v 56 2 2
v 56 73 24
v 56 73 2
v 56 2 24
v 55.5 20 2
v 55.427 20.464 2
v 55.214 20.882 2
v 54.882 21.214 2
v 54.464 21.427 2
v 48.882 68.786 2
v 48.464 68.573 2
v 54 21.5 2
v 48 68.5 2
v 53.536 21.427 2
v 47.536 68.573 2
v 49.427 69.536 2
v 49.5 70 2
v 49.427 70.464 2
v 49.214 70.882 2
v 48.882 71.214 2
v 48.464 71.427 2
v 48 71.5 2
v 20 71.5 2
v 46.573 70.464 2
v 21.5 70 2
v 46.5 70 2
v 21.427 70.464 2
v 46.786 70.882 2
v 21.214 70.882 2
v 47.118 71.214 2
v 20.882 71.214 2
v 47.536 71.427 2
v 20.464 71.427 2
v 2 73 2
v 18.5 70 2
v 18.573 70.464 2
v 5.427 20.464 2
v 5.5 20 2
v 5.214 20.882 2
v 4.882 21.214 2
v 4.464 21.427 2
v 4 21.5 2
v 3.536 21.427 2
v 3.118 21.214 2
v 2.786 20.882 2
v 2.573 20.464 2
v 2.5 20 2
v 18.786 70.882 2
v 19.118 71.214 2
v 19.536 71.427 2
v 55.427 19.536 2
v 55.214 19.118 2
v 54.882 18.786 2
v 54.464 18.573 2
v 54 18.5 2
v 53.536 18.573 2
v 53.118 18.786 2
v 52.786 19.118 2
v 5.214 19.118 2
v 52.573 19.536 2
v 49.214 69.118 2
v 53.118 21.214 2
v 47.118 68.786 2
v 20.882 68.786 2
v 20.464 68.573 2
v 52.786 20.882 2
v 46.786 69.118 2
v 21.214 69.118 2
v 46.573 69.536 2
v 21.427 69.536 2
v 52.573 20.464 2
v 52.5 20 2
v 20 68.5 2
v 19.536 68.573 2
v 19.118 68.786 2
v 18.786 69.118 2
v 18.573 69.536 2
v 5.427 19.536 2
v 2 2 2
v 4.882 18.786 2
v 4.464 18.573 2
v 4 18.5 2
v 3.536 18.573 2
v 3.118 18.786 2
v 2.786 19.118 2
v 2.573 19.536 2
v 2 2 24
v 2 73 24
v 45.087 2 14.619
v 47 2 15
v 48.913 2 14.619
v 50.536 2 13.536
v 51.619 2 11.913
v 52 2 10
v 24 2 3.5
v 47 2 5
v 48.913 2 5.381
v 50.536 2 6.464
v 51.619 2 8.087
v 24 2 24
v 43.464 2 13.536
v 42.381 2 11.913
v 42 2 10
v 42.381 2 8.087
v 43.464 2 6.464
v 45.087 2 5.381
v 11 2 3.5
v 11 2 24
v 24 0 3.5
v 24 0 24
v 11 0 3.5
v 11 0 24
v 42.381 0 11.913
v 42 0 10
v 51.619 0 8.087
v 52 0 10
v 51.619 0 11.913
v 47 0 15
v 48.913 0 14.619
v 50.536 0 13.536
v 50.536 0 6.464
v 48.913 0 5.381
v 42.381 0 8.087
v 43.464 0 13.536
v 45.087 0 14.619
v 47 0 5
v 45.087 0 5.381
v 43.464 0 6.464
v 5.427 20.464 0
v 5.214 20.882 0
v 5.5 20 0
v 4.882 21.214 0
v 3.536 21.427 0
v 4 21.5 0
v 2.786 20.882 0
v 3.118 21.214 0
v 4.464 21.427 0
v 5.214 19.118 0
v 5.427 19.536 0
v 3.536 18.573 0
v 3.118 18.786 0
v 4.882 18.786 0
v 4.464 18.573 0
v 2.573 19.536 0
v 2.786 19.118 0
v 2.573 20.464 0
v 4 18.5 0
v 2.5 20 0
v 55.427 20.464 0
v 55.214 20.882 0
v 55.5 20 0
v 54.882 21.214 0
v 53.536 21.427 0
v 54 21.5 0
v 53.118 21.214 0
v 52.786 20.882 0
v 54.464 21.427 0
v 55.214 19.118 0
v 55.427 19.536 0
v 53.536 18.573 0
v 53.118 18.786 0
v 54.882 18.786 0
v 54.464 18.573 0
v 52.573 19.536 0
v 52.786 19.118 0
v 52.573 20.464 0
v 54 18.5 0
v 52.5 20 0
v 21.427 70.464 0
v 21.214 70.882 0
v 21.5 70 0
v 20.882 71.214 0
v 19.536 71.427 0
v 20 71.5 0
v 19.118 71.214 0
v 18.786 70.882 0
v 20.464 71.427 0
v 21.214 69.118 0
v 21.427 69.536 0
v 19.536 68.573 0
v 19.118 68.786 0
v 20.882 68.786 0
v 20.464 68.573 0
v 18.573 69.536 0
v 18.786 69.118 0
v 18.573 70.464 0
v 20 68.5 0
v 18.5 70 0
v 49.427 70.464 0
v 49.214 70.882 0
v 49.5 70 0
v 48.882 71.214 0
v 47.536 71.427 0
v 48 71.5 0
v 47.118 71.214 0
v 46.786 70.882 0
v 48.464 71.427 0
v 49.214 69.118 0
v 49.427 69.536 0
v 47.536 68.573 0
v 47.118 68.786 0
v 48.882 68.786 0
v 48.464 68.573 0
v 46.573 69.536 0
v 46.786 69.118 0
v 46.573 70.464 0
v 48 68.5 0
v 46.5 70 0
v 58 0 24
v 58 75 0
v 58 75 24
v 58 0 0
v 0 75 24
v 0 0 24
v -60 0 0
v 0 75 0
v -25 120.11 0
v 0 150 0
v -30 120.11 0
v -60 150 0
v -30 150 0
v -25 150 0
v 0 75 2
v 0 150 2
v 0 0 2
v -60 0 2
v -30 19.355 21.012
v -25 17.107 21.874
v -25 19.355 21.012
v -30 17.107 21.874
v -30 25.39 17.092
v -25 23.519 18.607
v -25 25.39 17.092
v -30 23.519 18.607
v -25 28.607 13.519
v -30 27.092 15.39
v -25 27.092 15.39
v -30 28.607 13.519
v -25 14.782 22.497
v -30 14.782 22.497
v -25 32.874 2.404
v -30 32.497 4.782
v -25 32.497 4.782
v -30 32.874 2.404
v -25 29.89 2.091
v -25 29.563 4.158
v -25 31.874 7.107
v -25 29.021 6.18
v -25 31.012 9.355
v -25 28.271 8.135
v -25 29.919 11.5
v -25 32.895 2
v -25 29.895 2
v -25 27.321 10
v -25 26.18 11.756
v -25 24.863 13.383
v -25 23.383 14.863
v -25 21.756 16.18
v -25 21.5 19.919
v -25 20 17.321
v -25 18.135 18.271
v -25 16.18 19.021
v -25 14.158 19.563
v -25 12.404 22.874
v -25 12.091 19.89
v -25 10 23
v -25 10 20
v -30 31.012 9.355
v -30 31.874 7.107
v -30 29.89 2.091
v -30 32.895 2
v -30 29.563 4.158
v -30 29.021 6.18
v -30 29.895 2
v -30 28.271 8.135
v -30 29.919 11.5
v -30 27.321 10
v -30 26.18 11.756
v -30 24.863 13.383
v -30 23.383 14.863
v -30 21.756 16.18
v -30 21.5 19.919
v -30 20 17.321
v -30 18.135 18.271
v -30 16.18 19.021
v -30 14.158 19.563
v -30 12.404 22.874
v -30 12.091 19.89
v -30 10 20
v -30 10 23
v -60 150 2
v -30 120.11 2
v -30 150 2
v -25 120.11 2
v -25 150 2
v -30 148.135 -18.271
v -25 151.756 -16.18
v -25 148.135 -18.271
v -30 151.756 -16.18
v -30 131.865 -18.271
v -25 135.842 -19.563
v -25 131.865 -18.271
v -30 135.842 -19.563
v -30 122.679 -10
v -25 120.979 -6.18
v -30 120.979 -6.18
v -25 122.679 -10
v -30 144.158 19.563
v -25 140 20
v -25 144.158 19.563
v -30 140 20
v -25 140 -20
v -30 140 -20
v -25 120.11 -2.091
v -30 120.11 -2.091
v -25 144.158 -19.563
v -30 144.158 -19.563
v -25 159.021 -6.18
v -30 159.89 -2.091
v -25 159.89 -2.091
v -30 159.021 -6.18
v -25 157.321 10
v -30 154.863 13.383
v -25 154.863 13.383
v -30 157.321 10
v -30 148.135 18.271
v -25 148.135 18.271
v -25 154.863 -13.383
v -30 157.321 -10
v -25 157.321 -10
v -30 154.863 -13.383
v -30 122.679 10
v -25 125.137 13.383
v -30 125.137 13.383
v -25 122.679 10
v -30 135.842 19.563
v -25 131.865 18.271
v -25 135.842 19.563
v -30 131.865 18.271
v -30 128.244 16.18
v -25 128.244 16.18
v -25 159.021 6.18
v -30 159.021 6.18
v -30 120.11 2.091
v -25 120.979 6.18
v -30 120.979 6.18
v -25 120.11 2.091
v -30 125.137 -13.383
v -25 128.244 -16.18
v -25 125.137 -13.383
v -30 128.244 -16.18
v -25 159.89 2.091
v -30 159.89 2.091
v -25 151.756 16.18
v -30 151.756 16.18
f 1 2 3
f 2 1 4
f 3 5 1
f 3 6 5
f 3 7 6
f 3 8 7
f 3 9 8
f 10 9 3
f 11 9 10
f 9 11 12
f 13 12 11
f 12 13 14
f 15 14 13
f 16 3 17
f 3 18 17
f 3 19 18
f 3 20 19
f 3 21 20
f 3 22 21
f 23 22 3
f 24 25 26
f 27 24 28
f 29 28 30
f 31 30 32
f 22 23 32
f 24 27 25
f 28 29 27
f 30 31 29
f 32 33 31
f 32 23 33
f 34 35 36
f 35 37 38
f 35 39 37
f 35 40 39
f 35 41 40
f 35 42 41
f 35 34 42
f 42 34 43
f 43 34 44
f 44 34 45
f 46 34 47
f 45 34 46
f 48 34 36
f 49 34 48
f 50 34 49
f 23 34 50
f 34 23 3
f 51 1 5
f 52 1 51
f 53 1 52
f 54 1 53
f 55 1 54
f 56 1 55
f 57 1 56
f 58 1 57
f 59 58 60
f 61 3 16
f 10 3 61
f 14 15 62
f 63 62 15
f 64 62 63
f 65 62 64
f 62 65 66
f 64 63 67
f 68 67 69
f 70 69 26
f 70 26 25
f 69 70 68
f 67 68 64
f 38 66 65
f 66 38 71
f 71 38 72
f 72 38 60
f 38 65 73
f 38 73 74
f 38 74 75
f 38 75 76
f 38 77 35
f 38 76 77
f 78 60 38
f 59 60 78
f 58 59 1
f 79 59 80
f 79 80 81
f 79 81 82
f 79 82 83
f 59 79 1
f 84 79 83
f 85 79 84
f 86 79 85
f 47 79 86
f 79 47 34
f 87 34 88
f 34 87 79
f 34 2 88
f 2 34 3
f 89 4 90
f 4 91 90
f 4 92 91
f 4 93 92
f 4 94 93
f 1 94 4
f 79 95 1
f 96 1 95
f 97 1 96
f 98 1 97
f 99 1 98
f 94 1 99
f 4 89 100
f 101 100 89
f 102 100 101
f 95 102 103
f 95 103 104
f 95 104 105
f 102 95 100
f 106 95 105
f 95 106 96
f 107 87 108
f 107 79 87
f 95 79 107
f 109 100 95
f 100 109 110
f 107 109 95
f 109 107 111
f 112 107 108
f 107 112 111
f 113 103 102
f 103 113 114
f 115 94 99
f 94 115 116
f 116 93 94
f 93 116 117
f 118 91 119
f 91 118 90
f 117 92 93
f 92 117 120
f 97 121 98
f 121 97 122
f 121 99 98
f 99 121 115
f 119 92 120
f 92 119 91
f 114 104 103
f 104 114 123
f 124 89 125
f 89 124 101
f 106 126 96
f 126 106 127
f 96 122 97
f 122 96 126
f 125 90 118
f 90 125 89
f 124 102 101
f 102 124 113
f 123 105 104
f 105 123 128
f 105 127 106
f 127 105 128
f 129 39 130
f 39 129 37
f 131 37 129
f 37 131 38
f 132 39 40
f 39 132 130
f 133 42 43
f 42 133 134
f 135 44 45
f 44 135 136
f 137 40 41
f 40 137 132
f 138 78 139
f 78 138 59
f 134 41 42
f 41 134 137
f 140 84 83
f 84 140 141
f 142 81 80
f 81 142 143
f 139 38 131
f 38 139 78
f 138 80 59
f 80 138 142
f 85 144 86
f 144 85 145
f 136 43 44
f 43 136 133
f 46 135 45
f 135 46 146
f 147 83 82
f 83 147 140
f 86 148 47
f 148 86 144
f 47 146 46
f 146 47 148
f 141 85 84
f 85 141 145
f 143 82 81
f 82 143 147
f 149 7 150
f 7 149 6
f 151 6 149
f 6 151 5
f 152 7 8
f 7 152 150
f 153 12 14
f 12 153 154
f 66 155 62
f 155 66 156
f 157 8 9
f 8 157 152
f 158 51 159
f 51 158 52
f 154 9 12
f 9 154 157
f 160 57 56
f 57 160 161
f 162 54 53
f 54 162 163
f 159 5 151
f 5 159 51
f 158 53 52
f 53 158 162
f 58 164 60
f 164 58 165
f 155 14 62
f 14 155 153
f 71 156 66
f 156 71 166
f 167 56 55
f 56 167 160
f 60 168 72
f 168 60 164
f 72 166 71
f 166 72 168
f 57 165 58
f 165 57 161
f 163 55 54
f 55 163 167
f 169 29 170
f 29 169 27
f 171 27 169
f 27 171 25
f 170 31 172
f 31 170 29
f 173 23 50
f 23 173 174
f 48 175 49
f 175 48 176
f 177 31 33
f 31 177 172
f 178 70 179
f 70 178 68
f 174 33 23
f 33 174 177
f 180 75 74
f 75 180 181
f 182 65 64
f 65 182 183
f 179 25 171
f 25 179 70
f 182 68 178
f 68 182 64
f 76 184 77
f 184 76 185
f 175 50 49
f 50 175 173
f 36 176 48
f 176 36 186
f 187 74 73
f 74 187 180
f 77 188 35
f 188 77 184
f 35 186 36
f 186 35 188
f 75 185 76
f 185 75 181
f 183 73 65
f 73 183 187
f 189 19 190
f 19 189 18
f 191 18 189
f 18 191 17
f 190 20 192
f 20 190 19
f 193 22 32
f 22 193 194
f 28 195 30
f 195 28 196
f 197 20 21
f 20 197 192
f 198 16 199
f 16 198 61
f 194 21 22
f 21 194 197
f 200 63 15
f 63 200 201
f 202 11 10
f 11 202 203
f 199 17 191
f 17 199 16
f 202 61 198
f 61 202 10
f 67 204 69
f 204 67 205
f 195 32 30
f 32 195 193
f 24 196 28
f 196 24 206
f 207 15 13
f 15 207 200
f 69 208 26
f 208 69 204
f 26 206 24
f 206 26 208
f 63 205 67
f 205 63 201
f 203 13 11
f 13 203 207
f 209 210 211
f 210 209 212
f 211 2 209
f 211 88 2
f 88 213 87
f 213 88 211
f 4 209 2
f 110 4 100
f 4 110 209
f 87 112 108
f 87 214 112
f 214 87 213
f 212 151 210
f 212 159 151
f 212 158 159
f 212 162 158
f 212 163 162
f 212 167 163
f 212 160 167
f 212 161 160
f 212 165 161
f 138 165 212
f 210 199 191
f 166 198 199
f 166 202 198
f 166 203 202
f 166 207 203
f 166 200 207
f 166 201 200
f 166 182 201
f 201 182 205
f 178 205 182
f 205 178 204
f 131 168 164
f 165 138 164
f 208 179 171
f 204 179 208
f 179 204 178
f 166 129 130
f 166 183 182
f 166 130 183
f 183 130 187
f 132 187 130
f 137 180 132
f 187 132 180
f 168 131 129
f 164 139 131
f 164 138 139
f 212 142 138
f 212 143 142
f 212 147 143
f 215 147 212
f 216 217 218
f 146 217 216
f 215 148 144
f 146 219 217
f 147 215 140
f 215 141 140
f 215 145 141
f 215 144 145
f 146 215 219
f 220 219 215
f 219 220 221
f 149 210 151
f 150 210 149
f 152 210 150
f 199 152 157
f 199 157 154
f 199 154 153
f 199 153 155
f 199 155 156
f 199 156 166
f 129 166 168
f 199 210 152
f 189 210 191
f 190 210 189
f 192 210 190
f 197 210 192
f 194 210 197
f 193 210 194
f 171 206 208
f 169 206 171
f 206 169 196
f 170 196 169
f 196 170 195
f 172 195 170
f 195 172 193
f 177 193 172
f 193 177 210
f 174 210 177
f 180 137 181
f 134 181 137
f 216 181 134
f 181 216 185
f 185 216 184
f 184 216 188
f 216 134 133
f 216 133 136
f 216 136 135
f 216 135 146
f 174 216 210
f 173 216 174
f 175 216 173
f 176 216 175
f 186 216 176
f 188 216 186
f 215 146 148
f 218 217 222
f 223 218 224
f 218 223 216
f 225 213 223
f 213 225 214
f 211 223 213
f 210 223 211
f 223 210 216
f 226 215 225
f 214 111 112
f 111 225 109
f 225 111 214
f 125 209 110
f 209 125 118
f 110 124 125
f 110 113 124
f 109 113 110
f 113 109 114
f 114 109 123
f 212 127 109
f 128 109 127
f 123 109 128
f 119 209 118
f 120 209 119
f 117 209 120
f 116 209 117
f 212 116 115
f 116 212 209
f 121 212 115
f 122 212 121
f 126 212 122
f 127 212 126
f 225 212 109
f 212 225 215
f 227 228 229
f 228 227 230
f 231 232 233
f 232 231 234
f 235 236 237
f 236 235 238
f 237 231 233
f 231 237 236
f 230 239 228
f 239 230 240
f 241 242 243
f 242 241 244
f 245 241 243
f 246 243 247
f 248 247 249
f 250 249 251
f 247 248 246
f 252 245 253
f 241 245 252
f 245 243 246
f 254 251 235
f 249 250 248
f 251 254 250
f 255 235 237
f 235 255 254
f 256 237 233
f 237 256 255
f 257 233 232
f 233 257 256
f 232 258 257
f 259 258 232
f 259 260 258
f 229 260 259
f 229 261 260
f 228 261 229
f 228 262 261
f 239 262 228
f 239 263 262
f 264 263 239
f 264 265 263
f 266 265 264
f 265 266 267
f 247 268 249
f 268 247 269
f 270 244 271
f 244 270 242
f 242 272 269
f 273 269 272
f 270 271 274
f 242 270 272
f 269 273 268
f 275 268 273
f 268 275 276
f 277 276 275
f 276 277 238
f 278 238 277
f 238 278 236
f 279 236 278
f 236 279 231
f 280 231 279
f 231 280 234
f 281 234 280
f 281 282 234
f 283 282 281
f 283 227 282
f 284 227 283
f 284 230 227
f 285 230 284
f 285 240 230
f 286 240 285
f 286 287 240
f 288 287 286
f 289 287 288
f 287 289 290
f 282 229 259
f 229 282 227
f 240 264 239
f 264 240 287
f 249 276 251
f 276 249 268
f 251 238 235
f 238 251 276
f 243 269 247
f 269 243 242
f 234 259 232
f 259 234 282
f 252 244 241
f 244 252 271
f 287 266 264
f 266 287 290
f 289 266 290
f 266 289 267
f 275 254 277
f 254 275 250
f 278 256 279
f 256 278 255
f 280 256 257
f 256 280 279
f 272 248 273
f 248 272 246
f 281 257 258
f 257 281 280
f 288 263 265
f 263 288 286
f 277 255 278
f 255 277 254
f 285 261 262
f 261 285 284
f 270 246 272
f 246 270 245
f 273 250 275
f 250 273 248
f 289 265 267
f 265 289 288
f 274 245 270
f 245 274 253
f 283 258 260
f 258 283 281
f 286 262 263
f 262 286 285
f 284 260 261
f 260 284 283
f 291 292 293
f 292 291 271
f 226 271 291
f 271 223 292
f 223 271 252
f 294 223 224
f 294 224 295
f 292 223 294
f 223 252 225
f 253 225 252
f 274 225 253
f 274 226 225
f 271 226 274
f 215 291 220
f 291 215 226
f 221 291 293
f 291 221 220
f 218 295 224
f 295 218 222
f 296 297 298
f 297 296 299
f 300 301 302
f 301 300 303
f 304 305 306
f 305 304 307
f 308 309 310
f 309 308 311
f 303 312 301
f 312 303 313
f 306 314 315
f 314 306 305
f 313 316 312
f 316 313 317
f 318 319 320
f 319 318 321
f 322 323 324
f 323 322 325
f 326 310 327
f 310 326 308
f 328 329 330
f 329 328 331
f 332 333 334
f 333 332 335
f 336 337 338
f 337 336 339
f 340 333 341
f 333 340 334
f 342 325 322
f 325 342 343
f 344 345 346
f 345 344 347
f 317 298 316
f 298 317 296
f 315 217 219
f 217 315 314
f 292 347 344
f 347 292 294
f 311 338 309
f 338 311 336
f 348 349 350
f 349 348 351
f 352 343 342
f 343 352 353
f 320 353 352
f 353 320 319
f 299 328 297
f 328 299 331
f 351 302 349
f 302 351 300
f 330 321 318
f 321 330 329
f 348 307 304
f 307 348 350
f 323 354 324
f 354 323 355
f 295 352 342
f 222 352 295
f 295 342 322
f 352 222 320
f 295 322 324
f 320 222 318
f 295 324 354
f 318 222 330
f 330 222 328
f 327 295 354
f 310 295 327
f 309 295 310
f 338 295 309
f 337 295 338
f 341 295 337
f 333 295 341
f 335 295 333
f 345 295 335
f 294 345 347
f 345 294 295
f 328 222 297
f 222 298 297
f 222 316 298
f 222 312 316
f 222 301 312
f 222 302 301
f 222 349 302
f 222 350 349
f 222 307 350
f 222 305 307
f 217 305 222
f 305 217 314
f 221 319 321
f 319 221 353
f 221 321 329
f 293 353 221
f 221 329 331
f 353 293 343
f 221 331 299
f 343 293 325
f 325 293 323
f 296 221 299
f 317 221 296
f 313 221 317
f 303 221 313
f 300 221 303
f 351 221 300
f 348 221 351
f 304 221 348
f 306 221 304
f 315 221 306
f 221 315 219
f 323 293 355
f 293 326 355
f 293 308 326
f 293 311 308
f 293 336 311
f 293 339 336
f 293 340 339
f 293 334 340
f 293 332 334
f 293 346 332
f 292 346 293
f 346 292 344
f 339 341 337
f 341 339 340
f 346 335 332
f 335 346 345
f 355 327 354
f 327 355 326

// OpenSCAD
wall = 2;
w = 54;
d = 71;
h = 20;


difference(){ // main case (no top, no cable manager)
    cube(size = [w+(2*wall),d+(2*wall),h+(2*wall)]); // main  box
    union(){
        union(){
            union(){
                union(){
                    union(){
                        union(){
                            translate([wall,wall,wall]){ // thickness of the walls
                                cube(size = [w,d,h+(2*wall)]); // inner cube
                            }
                            translate([9+wall,-1,1.5 + wall]){ // usb hole
                                cube(size = [13,13,22]);
                            }
                        }
                        translate([45+wall,6,8+wall]){ // charger hall
                            rotate([90,0,0]){
                                cylinder(h=8, r1=5, r2=5);
                                }
                            }
                    }
                    translate([2+wall,18 + wall,-1]){ // bottom left hole
                        cylinder(h=7, r1=1.5, r2=1.5, $fn=20);
                    }
                }
                translate([52+ wall,18 + wall,-1]){ // bottom right hole
                    cylinder(h=7, r1=1.5, r2=1.5, $fn=20);
                }
            }
            translate([18+wall,68 + wall,-1]){ // top left hole
                cylinder(h=7, r1=1.5, r2=1.5, $fn=20);
            }
        }
        translate([46 + wall,68 + wall,-1]){ // top right hole
            cylinder(h=7, r1=1.5, r2=1.5, $fn=20);
        }
    }
}

translate([-60,0,0]){//floor of the cable manager
    cube(size = [60,150,wall]);
}
difference(){
    intersection(){
        translate([-30,10,0]){
            rotate([0,90,0]){
                cylinder(h = 5, r1 = 23, r2 = 23,$fn=60);
            }
        }

        translate([-30,10,0]){
            cube(23);
        }
    }
    
    translate([-31,10,0]){
            rotate([0,90,0]){
                cylinder(h = 7, r1 = 20, r2 = 20,$fn=60);
            }
        }
}

translate([-30,140,0]){
    rotate([0,90,0]){
        cylinder(h = 5, r1 = 20, r2 = 20);
    }
}
